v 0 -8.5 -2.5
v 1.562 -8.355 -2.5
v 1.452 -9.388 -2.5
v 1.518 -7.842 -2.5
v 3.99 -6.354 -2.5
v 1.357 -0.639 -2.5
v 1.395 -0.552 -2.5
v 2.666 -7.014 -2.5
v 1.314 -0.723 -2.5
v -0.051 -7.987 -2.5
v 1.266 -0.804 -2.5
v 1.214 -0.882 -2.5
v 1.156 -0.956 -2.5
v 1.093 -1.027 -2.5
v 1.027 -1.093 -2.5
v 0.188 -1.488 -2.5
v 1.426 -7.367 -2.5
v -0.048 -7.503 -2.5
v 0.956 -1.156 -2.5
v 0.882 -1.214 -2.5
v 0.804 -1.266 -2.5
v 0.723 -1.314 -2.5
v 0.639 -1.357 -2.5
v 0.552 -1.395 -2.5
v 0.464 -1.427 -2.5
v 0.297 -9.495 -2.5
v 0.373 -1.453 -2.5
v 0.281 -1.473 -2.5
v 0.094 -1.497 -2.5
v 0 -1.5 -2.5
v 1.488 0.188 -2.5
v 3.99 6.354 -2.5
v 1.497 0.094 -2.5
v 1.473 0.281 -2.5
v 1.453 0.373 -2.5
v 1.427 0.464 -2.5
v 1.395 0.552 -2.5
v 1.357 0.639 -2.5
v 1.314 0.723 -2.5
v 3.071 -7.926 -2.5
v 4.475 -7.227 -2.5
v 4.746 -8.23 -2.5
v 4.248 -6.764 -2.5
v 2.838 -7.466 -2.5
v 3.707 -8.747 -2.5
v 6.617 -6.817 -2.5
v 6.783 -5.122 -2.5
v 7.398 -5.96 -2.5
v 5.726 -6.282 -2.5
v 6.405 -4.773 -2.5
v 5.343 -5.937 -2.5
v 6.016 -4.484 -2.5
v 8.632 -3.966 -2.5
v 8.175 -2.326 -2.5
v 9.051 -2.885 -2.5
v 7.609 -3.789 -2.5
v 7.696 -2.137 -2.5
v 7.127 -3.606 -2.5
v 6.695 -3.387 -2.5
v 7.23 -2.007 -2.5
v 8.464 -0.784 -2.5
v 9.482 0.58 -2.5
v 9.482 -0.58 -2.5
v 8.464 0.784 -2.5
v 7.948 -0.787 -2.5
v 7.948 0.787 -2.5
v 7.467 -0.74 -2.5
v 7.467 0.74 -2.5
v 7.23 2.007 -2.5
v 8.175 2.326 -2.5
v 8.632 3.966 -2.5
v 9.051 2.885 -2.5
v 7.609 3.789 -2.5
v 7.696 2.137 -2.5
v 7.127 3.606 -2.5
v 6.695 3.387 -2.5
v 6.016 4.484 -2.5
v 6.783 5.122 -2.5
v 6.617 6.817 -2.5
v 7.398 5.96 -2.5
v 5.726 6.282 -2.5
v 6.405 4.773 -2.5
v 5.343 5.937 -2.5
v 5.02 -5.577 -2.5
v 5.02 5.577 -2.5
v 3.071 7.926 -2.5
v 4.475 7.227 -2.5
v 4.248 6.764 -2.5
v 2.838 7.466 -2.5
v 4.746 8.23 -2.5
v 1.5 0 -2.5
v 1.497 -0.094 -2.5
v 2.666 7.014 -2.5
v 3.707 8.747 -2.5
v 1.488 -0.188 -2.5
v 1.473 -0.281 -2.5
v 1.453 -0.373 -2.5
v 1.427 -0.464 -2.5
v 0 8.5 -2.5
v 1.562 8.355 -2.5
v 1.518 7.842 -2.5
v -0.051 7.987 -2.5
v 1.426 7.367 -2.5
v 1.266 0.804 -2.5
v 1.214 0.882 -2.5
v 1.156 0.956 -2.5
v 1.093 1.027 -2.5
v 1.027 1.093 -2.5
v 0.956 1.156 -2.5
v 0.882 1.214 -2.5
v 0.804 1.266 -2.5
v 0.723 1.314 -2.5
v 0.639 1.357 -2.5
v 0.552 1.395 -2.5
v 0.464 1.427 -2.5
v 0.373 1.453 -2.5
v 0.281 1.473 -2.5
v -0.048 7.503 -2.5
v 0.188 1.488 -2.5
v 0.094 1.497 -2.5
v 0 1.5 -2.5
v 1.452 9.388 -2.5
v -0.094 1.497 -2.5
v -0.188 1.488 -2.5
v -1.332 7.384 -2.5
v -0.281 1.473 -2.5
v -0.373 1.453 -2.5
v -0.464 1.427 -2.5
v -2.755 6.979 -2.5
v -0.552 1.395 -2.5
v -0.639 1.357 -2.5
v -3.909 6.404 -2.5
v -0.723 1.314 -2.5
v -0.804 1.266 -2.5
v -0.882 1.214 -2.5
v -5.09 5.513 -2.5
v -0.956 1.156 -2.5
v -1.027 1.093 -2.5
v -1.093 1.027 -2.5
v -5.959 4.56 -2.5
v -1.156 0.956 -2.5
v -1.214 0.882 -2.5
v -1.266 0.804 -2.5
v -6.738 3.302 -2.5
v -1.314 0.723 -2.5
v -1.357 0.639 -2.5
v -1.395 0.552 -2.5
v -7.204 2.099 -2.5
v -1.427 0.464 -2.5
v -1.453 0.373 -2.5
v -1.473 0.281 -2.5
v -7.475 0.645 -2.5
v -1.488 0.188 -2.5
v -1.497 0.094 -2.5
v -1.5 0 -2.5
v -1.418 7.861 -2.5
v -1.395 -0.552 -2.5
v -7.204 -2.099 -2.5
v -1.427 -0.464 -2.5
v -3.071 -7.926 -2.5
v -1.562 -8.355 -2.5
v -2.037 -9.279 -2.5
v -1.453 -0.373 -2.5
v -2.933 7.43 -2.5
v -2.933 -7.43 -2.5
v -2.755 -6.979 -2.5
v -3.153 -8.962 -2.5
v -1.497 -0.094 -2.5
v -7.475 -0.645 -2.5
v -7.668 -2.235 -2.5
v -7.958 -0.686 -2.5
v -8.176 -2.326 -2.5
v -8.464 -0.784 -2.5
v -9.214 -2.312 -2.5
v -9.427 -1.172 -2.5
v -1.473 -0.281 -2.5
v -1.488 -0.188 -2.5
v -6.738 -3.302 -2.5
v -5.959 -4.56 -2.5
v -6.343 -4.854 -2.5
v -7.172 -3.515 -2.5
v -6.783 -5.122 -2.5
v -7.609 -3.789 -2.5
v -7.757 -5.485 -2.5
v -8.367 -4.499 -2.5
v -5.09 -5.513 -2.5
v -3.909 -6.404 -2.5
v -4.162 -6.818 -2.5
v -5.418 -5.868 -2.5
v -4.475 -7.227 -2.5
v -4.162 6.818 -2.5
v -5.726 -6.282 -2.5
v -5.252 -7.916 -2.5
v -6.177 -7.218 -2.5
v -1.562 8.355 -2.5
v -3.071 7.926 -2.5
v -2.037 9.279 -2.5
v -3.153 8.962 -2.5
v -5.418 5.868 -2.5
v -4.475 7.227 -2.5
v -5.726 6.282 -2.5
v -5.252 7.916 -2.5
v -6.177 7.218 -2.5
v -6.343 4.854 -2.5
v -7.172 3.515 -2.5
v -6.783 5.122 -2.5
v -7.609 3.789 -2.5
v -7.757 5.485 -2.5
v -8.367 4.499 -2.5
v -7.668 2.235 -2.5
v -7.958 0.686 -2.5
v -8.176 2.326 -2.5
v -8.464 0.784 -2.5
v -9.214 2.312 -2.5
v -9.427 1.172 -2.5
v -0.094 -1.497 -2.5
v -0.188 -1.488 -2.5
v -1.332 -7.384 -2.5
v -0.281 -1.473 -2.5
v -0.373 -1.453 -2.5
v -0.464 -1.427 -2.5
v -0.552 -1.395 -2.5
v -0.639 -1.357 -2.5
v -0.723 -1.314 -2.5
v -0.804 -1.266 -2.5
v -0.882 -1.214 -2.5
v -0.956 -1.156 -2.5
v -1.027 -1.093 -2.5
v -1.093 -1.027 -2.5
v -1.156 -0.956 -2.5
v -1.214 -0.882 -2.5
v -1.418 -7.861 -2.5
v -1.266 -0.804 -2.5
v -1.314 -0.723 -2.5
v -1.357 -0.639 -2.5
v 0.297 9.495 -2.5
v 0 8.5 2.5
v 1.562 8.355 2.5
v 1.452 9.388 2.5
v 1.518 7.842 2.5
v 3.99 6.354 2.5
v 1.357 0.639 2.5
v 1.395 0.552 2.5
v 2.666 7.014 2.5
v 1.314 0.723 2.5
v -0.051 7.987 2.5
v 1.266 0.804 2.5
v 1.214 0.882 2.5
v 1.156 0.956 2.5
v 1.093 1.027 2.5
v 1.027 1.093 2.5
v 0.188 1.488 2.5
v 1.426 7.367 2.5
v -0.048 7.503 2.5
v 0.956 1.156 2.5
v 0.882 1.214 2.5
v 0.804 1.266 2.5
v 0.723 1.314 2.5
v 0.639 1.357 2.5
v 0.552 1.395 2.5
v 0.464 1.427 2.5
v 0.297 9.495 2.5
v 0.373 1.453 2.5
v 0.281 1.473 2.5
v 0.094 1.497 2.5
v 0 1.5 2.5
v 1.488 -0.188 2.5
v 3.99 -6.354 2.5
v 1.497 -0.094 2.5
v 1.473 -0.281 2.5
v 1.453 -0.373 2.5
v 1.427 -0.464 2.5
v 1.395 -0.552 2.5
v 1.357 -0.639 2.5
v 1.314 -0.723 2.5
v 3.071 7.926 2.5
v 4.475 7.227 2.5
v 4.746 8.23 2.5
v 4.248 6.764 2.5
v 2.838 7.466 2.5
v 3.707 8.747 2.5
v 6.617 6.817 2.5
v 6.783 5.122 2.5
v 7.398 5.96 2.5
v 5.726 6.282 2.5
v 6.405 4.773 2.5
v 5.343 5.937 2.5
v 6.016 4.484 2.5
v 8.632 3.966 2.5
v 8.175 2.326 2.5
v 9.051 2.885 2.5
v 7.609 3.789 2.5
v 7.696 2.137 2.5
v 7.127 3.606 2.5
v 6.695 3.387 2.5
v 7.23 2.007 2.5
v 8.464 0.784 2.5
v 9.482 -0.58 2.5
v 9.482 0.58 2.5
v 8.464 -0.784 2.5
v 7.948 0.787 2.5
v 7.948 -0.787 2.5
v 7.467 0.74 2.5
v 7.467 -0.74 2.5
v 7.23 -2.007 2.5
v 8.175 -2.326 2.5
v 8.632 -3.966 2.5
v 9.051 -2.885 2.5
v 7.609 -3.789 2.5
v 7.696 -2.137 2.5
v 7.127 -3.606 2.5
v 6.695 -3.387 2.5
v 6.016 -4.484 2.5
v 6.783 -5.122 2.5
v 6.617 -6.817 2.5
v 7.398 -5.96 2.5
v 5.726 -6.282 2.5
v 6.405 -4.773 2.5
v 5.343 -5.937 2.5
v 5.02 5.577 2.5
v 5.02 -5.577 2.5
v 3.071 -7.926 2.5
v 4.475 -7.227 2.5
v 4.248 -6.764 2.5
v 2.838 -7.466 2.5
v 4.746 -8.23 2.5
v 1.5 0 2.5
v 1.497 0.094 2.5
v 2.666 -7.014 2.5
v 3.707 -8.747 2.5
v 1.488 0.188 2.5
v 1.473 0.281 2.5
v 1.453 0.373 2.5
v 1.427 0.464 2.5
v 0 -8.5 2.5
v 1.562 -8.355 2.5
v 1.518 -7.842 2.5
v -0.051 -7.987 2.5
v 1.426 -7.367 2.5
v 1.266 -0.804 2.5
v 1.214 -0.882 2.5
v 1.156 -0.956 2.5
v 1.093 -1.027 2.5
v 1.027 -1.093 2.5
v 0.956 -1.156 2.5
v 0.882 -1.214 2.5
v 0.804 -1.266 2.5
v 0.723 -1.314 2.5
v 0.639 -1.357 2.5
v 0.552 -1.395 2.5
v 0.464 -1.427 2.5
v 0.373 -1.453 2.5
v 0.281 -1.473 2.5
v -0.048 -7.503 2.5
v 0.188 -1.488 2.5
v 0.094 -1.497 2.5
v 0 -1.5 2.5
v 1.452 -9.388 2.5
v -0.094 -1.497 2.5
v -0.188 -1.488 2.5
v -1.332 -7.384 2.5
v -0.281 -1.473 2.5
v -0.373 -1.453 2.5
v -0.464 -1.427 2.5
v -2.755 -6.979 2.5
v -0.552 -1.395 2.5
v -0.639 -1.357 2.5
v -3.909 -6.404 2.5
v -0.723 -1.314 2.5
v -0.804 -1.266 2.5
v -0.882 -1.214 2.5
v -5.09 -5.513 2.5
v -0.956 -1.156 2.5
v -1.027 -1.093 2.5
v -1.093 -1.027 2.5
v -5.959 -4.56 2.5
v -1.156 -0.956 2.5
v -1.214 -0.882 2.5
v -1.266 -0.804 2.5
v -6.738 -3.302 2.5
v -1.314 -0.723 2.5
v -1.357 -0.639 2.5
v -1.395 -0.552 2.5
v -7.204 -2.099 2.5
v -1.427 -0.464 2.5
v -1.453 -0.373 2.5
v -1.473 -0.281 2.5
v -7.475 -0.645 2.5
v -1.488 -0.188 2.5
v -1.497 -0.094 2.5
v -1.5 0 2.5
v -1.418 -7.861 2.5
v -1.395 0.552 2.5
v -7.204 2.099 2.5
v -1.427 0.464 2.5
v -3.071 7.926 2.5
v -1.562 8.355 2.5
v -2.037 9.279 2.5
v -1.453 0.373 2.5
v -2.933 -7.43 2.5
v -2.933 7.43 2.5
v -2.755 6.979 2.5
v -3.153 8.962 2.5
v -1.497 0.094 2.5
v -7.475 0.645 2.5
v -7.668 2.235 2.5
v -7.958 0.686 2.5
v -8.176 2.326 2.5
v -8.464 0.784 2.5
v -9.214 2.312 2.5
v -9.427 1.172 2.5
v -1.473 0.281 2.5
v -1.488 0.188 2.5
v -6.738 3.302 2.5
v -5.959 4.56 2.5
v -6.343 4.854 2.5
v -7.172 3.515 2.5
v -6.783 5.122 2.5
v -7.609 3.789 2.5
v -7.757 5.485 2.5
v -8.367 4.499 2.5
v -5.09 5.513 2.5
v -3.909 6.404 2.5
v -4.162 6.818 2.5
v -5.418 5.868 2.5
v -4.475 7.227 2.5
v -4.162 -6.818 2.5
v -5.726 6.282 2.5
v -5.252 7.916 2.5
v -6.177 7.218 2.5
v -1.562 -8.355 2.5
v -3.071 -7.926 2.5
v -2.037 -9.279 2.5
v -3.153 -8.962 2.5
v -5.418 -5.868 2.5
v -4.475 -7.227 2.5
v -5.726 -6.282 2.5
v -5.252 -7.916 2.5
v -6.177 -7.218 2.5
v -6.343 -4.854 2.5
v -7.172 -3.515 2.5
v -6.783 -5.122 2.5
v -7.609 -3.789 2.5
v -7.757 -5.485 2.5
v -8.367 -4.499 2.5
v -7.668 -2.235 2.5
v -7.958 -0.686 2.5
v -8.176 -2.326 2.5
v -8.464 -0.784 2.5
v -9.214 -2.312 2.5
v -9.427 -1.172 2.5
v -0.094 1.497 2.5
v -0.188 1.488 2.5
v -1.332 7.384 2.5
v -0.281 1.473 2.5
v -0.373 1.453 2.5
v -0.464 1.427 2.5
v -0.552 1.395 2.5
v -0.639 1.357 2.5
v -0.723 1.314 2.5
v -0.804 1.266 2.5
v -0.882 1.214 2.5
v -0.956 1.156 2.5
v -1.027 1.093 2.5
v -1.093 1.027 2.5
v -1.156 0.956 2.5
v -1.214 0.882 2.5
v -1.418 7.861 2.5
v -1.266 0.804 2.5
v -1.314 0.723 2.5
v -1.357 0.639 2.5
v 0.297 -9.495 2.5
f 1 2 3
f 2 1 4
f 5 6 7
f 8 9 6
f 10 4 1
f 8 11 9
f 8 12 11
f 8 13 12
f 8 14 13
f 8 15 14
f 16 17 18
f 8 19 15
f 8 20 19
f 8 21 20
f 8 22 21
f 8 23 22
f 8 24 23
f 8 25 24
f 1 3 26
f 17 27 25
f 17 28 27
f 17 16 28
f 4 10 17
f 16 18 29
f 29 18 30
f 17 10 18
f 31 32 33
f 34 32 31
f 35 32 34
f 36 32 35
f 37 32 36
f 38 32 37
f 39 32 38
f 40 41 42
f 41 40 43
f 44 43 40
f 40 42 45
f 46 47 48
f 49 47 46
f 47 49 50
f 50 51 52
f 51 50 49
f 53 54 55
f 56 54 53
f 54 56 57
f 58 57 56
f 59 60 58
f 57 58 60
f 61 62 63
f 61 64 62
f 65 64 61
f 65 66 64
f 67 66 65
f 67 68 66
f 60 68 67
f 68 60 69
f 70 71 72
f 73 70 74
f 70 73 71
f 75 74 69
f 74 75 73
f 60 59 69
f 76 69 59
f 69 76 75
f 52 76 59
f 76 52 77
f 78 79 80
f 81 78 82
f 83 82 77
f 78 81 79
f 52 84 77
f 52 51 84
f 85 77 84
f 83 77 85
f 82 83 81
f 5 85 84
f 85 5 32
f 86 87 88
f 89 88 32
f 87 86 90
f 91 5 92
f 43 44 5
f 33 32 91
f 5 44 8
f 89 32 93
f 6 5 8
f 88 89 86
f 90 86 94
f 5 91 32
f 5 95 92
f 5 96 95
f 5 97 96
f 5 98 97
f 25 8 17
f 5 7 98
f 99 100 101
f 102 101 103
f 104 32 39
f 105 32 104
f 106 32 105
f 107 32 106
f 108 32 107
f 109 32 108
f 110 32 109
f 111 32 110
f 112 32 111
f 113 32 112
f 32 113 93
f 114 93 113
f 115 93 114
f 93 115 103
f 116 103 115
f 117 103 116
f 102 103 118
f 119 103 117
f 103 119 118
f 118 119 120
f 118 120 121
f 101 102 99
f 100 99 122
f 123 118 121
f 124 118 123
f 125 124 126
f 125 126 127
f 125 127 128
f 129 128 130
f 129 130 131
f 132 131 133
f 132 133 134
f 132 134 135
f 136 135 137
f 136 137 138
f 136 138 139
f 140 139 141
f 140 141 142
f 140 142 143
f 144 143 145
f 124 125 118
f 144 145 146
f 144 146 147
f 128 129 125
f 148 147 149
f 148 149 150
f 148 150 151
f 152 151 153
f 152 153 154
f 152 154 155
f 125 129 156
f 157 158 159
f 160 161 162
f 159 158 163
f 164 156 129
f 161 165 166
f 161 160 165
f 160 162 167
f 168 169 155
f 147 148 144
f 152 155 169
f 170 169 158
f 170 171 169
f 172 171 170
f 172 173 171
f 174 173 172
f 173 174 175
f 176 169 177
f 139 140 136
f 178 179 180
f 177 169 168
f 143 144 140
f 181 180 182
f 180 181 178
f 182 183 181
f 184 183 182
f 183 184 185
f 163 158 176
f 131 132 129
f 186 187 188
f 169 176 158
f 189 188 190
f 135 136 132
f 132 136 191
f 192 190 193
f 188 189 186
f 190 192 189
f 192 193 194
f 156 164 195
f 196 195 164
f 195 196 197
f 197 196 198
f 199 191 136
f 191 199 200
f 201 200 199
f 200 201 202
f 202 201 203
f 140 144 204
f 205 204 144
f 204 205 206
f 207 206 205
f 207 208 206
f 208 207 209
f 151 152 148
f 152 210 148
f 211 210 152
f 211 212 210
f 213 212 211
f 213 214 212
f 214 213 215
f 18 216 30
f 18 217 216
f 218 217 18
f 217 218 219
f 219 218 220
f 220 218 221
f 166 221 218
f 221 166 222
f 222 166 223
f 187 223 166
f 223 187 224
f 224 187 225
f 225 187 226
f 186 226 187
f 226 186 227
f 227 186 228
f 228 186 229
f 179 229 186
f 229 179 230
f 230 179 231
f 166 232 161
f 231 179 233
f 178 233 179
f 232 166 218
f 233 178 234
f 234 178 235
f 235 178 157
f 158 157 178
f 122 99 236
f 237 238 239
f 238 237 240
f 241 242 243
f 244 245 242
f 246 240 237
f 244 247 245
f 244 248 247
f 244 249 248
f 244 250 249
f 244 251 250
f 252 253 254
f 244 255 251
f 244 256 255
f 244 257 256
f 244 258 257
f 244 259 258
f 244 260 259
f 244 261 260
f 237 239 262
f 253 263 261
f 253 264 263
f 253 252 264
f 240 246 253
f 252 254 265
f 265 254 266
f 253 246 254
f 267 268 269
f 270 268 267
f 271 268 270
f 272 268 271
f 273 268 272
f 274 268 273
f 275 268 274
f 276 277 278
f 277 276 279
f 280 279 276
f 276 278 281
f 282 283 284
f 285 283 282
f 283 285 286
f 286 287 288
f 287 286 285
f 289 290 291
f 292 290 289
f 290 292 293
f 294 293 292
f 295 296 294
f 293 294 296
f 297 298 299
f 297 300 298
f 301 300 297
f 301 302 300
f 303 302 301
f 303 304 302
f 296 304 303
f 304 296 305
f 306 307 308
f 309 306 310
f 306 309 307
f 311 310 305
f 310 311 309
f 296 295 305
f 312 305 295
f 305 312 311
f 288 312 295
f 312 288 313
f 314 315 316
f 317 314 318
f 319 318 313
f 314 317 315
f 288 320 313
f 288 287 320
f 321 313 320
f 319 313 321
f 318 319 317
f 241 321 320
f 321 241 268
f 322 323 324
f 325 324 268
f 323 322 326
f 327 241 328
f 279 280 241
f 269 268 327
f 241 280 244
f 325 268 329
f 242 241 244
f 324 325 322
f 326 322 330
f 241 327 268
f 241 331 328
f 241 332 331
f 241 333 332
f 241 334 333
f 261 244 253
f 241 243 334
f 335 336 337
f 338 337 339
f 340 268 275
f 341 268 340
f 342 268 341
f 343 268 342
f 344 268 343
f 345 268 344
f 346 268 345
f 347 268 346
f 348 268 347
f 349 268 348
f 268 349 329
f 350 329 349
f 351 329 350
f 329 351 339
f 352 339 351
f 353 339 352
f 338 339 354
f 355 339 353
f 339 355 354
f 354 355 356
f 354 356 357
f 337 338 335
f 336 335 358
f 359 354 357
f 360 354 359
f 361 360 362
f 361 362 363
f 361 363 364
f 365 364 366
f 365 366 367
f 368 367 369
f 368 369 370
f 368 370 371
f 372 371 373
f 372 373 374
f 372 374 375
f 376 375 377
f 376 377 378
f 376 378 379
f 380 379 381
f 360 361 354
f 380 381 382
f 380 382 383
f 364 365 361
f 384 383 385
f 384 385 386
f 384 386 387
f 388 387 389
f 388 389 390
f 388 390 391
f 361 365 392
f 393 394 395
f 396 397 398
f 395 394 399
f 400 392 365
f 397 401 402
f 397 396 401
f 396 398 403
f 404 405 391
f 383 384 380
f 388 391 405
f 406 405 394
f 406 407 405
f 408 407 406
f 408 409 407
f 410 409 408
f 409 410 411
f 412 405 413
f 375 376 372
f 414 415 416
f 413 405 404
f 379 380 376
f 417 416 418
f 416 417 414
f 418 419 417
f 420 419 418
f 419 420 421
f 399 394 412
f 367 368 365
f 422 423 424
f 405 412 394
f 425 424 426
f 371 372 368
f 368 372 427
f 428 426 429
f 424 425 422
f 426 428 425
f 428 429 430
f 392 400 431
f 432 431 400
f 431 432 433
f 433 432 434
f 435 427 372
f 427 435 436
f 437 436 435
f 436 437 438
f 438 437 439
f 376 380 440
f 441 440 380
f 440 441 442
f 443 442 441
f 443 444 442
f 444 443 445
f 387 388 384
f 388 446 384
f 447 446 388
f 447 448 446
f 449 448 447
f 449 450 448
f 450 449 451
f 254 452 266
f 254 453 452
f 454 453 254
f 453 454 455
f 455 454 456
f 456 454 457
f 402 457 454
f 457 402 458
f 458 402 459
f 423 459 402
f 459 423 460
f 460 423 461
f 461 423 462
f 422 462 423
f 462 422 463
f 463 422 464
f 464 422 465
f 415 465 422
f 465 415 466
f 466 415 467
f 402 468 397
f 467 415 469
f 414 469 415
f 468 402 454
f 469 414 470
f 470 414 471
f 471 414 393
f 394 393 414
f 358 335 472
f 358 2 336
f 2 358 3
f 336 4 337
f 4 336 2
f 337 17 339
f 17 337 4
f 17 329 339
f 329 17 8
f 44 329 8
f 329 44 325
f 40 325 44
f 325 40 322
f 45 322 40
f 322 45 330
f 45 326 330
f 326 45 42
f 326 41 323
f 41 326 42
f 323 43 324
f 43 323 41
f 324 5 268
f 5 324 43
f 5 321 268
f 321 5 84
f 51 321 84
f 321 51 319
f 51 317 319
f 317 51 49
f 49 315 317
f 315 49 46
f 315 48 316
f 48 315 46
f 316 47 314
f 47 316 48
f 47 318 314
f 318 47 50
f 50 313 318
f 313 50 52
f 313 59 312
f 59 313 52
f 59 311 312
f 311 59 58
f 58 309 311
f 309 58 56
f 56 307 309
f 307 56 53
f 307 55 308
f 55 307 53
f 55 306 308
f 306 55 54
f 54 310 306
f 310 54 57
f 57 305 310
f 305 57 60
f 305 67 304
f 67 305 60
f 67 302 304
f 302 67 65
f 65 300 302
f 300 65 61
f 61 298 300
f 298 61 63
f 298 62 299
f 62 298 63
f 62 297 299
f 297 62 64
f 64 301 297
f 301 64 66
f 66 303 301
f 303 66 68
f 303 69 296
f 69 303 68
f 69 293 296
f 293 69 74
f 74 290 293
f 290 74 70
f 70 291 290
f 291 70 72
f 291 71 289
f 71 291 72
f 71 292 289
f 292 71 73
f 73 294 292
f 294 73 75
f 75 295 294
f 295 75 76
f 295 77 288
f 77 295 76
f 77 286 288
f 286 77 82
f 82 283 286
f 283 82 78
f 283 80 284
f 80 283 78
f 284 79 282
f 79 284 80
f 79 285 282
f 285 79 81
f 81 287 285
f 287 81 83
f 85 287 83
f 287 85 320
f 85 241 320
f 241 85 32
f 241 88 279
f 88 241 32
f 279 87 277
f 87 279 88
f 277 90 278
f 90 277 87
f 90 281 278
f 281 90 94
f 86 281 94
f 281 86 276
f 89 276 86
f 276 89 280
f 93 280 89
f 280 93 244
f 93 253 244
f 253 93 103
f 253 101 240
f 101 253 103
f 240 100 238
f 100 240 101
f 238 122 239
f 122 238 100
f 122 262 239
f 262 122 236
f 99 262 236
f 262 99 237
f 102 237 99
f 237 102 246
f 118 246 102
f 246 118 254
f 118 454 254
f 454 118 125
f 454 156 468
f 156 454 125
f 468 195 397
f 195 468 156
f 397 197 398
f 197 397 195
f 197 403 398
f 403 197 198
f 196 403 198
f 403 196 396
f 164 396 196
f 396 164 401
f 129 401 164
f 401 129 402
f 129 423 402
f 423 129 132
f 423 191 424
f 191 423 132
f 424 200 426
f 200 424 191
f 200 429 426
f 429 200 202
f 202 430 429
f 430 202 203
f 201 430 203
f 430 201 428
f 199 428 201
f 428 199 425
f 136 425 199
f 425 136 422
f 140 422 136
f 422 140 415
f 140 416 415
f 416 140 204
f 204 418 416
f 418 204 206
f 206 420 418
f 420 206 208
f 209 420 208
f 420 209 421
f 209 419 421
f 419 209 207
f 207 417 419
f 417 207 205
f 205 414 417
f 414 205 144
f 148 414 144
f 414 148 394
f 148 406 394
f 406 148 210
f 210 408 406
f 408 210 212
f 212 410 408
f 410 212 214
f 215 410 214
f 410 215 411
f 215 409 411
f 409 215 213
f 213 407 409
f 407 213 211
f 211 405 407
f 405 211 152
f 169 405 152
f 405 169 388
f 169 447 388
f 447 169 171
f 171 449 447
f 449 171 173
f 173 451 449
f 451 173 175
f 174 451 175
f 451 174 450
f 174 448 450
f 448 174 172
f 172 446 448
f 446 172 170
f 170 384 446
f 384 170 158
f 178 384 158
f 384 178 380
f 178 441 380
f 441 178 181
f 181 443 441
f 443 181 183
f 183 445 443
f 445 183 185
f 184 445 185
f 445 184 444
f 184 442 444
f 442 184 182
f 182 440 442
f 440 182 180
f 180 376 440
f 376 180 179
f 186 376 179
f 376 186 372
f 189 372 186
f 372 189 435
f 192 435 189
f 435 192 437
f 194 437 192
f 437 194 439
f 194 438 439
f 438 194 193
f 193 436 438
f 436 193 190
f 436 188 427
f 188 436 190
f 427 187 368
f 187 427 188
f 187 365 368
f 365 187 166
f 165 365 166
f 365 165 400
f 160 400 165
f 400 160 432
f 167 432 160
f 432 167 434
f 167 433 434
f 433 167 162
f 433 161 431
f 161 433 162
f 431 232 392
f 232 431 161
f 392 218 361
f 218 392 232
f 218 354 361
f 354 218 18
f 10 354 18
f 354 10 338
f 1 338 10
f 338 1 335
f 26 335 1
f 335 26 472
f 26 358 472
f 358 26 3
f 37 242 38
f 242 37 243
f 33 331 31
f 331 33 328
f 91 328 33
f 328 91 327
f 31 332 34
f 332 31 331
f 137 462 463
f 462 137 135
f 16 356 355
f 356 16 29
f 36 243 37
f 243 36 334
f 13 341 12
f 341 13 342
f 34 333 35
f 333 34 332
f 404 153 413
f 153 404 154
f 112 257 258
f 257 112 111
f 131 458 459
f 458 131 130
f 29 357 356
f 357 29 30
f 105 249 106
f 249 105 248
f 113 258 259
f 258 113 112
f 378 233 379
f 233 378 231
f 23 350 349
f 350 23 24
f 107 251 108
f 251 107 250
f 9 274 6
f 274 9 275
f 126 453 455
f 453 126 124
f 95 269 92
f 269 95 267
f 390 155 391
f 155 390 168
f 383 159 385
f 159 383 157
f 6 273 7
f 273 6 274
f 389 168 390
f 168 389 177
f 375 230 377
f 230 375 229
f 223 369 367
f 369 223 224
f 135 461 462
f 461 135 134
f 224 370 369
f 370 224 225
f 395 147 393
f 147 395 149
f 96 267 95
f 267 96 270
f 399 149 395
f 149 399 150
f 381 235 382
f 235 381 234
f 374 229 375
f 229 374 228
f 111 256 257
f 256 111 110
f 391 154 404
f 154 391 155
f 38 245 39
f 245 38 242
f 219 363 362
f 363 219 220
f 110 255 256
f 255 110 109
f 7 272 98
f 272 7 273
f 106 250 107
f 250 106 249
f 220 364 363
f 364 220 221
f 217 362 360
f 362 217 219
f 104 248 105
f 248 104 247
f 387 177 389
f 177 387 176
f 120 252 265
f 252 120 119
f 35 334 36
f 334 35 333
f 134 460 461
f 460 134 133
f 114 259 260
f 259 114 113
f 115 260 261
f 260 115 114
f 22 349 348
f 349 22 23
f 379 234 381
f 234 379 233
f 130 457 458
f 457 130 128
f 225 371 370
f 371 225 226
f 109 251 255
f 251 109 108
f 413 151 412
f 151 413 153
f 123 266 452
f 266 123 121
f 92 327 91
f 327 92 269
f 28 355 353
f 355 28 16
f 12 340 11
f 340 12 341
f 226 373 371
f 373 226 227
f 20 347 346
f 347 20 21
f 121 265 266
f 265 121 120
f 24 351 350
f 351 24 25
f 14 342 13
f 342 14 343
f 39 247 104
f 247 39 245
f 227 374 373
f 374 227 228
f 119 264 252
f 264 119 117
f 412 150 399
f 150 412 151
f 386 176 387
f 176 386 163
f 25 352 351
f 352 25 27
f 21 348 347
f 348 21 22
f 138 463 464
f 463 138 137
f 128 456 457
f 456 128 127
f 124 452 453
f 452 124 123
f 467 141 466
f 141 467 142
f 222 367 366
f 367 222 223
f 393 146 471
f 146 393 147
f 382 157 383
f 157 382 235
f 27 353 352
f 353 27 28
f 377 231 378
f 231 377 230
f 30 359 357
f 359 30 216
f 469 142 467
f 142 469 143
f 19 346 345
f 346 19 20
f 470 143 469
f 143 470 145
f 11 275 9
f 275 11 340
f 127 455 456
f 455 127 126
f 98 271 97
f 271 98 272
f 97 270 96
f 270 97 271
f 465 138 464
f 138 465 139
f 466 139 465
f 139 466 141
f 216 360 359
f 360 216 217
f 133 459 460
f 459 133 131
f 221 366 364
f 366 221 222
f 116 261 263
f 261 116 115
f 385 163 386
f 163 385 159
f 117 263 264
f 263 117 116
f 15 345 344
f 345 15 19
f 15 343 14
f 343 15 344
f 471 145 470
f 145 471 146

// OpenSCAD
height = 5;
type = "Spur"; // [Spur,Cog,Double Helix(beta), Single Helix]
teeth = 17;	//	[5:56]
scale = 100;//[3:100]
hole = "Yes"; //[Yes,No]
//don't make too big or your gear will disappear
holeSize = 1.5;
if (type == "Spur")
{
if(hole == "Yes")
{
hole();
}
else
{
spur();
}
}
else if(type == "Cog")
{
if(hole == "Yes")
{
hole();
}
else
{
cog();
}
}
else if(type == "Double Helix(beta)")
{
if(hole == "Yes")
{
hole();
}
else
{
double_helix();
}
}
else if (type == "Single Helix")
{
if(hole == "Yes")
{
hole();
}
else
{
single_helix();
}
}


module gear(number_of_teeth,
		circular_pitch=false, diametral_pitch=false,
		pressure_angle=20, clearance = 0)
{

	//Convert diametrial pitch to our native circular pitch
	circular_pitch = (circular_pitch!=false?circular_pitch:180/diametral_pitch);

	// Pitch diameter: Diameter of pitch circle.
	pitch_diameter  =  number_of_teeth * circular_pitch / 180;
	pitch_radius = pitch_diameter/2;

	// Base Circle
	base_diameter = pitch_diameter*cos(pressure_angle);
	base_radius = base_diameter/2;

	// Diametrial pitch: Number of teeth per unit length.
	pitch_diametrial = number_of_teeth / pitch_diameter;

	// Addendum: Radial distance from pitch circle to outside circle.
	addendum = 1/pitch_diametrial;

	//Outer Circle
	outer_radius = pitch_radius+addendum;
	outer_diameter = outer_radius*2;

	// Dedendum: Radial distance from pitch circle to root diameter
	dedendum = addendum + clearance;

	// Root diameter: Diameter of bottom of tooth spaces.
	root_radius = pitch_radius-dedendum;
	root_diameter = root_radius * 2;

	half_thick_angle = 360 / (4 * number_of_teeth);

	union()
	{
		rotate(half_thick_angle) circle($fn=number_of_teeth*2, r=root_radius*1.001);

		for (i= [1:number_of_teeth])
		//for (i = [0])
		{
			rotate([0,0,i*360/number_of_teeth])
			{
				involute_gear_tooth(
					pitch_radius = pitch_radius,
					root_radius = root_radius,
					base_radius = base_radius,
					outer_radius = outer_radius,
					half_thick_angle = half_thick_angle);
			}
		}
	}
}


module involute_gear_tooth(
					pitch_radius,
					root_radius,
					base_radius,
					outer_radius,
					half_thick_angle
					)
{
	pitch_to_base_angle  = involute_intersect_angle( base_radius, pitch_radius );

	outer_to_base_angle = involute_intersect_angle( base_radius/2, outer_radius*1);

	base1 = 0 - pitch_to_base_angle - half_thick_angle;
	pitch1 = 0 - half_thick_angle;
	outer1 = outer_to_base_angle - pitch_to_base_angle - half_thick_angle;

	b1 = polar_to_cartesian([ base1, base_radius ]);
	p1 = polar_to_cartesian([ pitch1, pitch_radius ]);
	o1 = polar_to_cartesian([ outer1, outer_radius ]);

	b2 = polar_to_cartesian([ -base1, base_radius ]);
	p2 = polar_to_cartesian([ -pitch1, pitch_radius ]);
	o2 = polar_to_cartesian([ -outer1, outer_radius ]);

	// ( root_radius > base_radius variables )
		pitch_to_root_angle = pitch_to_base_angle - involute_intersect_angle(base_radius, root_radius );
		root1 = pitch1 - pitch_to_root_angle;
		root2 = -pitch1 + pitch_to_root_angle;
		r1_t =  polar_to_cartesian([ root1, root_radius ]);
		r2_t =  polar_to_cartesian([ -root1, root_radius ]);

	// ( else )
		r1_f =  polar_to_cartesian([ base1, root_radius ]);
		r2_f =  polar_to_cartesian([ -base1, root_radius ]);

	if (root_radius > base_radius)
	{
		//echo("true");
		polygon( points = [
			r1_t,p1,o1,o2,p2,r2_t
		], convexity = 3);
	}
	else
	{
		polygon( points = [
			r1_f, b1,p1,o1,o2,p2,b2,r2_f
		], convexity = 3);
	}

}

// Mathematical Functions
//===============

// Finds the angle of the involute about the base radius at the given distance (radius) from it's center.
//source: http://www.mathhelpforum.com/math-help/geometry/136011-circle-involute-solving-y-any-given-x.html

function involute_intersect_angle(base_radius, radius) = sqrt( pow(radius/base_radius,2) - 1);



// Polar coord [angle, radius] to cartesian coord [x,y]

function polar_to_cartesian(polar) = [
	polar[1]*cos(polar[0]),
	polar[1]*sin(polar[0])
];


// Test Cases
//===============

module test_gears()
{
	gear(number_of_teeth=51,circular_pitch=200);
	translate([0, 50])gear(number_of_teeth=17,circular_pitch=200);
	translate([-50,0]) gear(number_of_teeth=17,diametral_pitch=1);
}
module cog()
{
		gear(number_of_teeth=teeth,diametral_pitch=scale/100);

}
module single_helix()
{
	translate([50,0]);
	{
	linear_extrude(height = height, center = true, convexity = 10, twist = -45)
	 gear(number_of_teeth=teeth,diametral_pitch=scale/100);
	}
}
module double_helix()
{



linear_extrude(height = height, center = true, convexity = 10, twist = -45)
	 gear(number_of_teeth=teeth,diametral_pitch=scale/100);
	translate([0,0,height]) linear_extrude(height = height, center = true, convexity = 10, twist = 45)
	 gear(number_of_teeth=teeth,diametral_pitch=scale/100);

}
module spur()
{

		translate([0,0]) linear_extrude(height = height, center = true, convexity = 10, twist = 0)
	 gear(number_of_teeth=teeth,diametral_pitch=1);


}

module demo_3d_gears()
{
	//double helical gear
	// (helics don't line up perfectly - for display purposes only ;)
	translate([50,0])
	{
	linear_extrude(height = 10, center = true, convexity = 10, twist = -45)
	 gear(number_of_teeth=17,diametral_pitch=1);
	translate([0,0,10]) linear_extrude(height = height, center = true, convexity = 10, twist = 45)
	 gear(number_of_teeth=17,diametral_pitch=1);
	}

	//spur gear
	translate([0,-50]) linear_extrude(height = height, center = true, convexity = 10, twist = 0)
	 gear(number_of_teeth=17,diametral_pitch=1);

}
module hole() {
   difference() {
if(type == "Spur")
{
translate([0,0]) linear_extrude(height = height, center = true, convexity = 10, twist = 0)
	 gear(number_of_teeth=teeth,diametral_pitch=1);
}
else if(type == "Cog")
{
gear(number_of_teeth=teeth,diametral_pitch=scale/100);
}
else if (type == "Double Helix(beta)")
{
linear_extrude(height = height, center = true, convexity = 10, twist = -45)
	 gear(number_of_teeth=teeth,diametral_pitch=scale/100);
	translate([0,0,height]) linear_extrude(height = height, center = true, convexity = 10, twist = 45)
	 gear(number_of_teeth=teeth,diametral_pitch=scale/100);
}
else if (type == "Single Helix")
{
linear_extrude(height = height, center = true, convexity = 10, twist = -45)
	 gear(number_of_teeth=teeth,diametral_pitch=scale/100);
}
# rotate ([0,0,0]) cylinder (h = height*4, r=holeSize, center = true, $fn=100);
}
}




module test_involute_curve()
{
	for (i=[0,1,2,3,4,5,6,7,8,9,10,11,12,13,14,15])
	{
		translate(polar_to_cartesian([involute_intersect_angle( 0.1,i) , i ])) circle($fn=15, r=0.5);
	}
}
